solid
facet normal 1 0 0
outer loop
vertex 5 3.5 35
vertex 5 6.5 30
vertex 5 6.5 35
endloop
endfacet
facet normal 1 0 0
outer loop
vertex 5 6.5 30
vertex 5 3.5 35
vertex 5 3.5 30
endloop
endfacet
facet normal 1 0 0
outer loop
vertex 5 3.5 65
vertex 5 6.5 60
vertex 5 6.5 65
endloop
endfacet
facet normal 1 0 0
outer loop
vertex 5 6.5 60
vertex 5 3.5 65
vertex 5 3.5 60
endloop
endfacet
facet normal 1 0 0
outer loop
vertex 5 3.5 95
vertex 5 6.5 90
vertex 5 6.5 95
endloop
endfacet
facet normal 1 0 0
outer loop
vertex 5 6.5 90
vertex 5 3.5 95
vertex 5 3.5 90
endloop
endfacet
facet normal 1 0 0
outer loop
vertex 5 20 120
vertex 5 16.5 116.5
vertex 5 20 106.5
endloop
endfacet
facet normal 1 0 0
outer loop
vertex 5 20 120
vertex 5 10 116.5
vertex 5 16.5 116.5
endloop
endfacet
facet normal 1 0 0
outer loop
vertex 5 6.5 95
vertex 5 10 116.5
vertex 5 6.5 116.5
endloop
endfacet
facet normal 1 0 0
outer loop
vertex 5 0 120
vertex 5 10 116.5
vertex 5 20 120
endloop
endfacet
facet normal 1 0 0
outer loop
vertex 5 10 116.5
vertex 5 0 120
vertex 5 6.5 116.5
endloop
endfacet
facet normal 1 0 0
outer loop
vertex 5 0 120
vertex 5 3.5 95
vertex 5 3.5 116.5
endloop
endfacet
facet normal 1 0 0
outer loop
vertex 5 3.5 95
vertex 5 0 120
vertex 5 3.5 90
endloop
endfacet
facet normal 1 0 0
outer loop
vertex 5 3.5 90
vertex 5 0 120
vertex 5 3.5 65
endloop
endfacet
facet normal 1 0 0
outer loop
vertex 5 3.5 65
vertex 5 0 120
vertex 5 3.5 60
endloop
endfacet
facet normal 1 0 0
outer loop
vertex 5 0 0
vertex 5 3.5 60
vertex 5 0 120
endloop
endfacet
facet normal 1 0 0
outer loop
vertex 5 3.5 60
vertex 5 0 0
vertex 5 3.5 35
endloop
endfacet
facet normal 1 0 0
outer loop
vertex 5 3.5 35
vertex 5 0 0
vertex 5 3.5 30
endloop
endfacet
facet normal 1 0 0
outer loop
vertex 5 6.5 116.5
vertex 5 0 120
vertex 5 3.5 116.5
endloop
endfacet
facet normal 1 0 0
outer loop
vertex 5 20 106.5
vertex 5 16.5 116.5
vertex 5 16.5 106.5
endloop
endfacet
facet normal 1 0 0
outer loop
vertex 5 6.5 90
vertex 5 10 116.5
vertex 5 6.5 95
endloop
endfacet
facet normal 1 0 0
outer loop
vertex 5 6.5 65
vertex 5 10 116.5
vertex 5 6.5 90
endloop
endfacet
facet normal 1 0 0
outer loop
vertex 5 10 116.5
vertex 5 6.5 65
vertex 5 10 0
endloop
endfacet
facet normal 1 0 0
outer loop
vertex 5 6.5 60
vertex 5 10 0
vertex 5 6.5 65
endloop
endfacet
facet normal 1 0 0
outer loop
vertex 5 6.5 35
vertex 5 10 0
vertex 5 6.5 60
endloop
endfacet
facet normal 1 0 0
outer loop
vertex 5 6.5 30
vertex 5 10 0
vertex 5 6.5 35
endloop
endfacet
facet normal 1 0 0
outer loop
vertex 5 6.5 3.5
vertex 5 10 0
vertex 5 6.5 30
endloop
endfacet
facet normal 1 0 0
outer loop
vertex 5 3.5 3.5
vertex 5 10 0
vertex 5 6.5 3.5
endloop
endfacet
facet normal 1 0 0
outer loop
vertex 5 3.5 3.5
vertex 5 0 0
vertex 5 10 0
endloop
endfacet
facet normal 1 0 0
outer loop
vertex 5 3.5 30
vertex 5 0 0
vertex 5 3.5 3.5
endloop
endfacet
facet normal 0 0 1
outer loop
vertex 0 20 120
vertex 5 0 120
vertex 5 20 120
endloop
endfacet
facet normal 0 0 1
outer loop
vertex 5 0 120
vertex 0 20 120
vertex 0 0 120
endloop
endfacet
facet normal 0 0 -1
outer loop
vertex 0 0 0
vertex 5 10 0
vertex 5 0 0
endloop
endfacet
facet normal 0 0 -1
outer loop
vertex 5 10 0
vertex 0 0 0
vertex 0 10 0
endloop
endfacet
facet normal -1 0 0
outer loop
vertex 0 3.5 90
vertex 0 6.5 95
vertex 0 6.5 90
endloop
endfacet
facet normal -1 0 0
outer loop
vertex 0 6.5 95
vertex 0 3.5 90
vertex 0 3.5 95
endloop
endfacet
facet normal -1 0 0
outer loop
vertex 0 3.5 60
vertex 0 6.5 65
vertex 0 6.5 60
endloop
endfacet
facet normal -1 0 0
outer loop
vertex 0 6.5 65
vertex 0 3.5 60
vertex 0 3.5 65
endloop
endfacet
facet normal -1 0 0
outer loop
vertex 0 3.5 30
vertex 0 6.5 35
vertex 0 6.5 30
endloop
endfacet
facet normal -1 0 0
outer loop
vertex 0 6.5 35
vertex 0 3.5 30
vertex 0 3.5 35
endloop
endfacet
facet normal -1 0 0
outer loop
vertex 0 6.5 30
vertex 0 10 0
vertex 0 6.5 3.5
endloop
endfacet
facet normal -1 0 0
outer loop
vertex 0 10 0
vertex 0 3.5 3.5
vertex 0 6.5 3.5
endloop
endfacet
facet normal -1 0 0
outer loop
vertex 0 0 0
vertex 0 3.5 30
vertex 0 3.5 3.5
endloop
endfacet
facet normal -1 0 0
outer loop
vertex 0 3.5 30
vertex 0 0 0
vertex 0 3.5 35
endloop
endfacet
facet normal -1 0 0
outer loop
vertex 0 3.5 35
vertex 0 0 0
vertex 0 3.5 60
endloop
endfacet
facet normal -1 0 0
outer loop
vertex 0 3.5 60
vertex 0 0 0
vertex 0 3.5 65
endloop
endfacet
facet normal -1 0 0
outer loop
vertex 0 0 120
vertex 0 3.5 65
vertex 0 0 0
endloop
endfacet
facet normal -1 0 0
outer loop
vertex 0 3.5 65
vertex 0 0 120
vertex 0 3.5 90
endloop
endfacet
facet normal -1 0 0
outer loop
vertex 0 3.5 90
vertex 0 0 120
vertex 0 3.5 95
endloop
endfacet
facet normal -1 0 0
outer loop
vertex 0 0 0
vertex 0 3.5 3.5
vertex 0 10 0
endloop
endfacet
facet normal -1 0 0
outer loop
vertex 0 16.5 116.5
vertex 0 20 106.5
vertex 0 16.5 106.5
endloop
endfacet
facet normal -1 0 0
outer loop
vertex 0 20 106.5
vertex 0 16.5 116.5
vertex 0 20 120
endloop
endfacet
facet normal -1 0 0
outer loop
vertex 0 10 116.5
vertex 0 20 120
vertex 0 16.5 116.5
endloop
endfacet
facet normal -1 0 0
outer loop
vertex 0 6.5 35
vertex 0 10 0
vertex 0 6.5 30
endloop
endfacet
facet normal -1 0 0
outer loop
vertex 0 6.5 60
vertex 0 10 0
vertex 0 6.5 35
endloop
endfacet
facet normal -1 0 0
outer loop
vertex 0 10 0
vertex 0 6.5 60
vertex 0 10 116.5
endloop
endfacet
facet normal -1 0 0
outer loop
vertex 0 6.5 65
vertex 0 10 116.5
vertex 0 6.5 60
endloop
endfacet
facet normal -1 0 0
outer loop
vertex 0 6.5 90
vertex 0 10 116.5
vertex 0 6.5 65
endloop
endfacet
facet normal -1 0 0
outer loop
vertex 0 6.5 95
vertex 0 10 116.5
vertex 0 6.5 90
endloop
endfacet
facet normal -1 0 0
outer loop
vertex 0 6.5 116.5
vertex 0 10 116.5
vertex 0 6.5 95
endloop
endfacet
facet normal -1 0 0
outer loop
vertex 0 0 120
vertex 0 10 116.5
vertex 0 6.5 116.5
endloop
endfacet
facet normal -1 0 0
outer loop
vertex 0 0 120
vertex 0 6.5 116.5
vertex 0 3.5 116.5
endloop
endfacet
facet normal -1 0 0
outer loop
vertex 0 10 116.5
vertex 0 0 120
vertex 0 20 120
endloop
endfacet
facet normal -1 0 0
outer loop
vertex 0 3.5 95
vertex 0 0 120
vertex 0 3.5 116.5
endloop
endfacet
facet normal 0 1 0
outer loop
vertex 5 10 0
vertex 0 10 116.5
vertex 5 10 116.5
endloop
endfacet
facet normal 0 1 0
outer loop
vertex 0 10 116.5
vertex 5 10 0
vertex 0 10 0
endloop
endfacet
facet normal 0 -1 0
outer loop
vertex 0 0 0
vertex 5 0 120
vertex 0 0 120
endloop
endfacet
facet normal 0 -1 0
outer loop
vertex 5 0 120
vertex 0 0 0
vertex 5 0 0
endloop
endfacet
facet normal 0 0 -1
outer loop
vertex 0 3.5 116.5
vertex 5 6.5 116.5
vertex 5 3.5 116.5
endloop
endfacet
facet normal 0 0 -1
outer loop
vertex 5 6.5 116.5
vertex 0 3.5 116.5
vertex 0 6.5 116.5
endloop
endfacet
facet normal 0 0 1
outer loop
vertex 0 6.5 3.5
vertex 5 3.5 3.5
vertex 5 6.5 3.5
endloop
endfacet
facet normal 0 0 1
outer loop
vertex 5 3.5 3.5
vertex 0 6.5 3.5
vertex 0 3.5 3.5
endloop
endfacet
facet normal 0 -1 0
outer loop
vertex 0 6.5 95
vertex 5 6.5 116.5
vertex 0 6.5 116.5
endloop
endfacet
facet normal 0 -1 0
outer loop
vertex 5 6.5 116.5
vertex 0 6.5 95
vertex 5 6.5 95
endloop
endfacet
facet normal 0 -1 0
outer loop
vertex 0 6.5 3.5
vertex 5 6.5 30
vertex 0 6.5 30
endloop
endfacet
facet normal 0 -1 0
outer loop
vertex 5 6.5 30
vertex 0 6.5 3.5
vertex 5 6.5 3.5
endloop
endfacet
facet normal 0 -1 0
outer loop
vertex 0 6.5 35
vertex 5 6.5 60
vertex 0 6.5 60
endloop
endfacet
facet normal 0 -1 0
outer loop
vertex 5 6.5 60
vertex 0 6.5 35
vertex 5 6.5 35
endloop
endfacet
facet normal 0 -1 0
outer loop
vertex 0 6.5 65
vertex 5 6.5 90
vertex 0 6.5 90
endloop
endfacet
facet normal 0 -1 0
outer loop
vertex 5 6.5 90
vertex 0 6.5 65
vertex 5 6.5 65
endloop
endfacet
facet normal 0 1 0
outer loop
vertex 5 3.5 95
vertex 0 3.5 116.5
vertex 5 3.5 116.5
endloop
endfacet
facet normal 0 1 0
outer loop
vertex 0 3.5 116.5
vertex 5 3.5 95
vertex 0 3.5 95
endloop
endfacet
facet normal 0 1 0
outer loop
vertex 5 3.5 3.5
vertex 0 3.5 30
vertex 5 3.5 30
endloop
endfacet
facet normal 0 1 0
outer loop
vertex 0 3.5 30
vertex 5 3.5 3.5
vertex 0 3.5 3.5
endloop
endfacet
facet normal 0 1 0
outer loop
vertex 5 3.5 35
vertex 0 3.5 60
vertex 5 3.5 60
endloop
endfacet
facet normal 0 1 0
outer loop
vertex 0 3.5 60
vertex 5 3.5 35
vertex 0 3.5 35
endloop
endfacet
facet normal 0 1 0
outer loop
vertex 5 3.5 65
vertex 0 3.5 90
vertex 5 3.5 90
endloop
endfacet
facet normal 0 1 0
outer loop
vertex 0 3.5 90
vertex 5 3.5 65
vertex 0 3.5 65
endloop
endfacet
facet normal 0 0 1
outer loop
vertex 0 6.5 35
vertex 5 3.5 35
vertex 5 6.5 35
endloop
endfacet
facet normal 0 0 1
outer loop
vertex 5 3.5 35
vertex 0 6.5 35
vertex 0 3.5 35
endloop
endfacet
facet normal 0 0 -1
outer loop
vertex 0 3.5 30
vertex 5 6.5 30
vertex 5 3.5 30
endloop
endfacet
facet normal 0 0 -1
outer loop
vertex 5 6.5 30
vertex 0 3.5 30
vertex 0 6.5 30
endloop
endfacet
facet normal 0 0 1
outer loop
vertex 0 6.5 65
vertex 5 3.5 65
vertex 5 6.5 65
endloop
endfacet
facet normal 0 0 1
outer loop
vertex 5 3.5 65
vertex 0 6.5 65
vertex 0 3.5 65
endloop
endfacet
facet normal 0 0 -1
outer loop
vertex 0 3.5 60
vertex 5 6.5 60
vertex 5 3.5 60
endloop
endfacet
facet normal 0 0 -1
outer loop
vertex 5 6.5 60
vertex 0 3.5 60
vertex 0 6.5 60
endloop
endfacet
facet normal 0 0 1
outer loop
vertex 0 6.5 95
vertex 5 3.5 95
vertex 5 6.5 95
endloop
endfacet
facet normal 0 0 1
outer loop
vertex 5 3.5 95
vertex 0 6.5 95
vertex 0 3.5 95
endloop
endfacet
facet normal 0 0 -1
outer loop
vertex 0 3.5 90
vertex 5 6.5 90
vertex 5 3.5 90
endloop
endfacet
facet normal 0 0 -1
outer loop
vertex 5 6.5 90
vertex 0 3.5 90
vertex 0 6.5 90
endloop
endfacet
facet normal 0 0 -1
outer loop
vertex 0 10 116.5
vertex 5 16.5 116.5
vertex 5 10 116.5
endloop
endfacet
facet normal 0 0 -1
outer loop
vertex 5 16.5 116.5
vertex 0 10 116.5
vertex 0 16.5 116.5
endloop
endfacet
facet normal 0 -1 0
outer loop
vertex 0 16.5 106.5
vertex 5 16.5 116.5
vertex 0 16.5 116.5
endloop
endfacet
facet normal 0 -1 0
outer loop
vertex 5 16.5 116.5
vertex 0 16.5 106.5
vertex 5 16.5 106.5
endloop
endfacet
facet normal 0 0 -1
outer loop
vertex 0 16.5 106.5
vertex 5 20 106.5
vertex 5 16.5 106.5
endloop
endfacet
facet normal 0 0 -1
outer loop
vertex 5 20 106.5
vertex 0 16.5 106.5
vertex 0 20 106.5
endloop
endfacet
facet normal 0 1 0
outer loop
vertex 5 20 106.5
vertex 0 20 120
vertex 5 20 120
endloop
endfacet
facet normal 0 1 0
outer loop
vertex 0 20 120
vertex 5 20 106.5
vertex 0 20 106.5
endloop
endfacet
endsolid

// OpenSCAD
// Model purpose: Structural large bar for the motorized blinds assembly, providing a reinforced vertical member and hook features that interface with blind hardware.
// Includes internal cutouts and cross-ribs to reduce material while preserving stiffness where load is applied.
screw_bar_depth = 5;
screw_bar_width = 10;
screw_bar_height = 120;

blind_depth = 6.5;
blind_gap = 3.5;
blind_hook_height = 10;

screw_bar_margin = 3.5;

module large_bar() {
  union() {
    difference() {
      cube([screw_bar_depth, screw_bar_width, screw_bar_height]);
      translate([0, screw_bar_margin, screw_bar_margin])
        cube([
          screw_bar_depth,
          screw_bar_width - screw_bar_margin * 2,
          screw_bar_height - screw_bar_margin * 2,
        ]);
    }

    translate([0, 0, screw_bar_height/4])
      cube([screw_bar_depth, screw_bar_width, 5]);

    translate([0, 0, 2*screw_bar_height/4])
      cube([screw_bar_depth, screw_bar_width, 5]);

    translate([0, 0, 3*screw_bar_height/4])
      cube([screw_bar_depth, screw_bar_width, 5]);

    translate([0, screw_bar_width, screw_bar_height - blind_gap])
      cube([screw_bar_depth, blind_depth, blind_gap]);

    translate([
      0,
      screw_bar_width + blind_depth,
      screw_bar_height - blind_gap - blind_hook_height
    ])
      cube([screw_bar_depth, blind_gap, blind_gap + blind_hook_height]);
  }
}

large_bar();
